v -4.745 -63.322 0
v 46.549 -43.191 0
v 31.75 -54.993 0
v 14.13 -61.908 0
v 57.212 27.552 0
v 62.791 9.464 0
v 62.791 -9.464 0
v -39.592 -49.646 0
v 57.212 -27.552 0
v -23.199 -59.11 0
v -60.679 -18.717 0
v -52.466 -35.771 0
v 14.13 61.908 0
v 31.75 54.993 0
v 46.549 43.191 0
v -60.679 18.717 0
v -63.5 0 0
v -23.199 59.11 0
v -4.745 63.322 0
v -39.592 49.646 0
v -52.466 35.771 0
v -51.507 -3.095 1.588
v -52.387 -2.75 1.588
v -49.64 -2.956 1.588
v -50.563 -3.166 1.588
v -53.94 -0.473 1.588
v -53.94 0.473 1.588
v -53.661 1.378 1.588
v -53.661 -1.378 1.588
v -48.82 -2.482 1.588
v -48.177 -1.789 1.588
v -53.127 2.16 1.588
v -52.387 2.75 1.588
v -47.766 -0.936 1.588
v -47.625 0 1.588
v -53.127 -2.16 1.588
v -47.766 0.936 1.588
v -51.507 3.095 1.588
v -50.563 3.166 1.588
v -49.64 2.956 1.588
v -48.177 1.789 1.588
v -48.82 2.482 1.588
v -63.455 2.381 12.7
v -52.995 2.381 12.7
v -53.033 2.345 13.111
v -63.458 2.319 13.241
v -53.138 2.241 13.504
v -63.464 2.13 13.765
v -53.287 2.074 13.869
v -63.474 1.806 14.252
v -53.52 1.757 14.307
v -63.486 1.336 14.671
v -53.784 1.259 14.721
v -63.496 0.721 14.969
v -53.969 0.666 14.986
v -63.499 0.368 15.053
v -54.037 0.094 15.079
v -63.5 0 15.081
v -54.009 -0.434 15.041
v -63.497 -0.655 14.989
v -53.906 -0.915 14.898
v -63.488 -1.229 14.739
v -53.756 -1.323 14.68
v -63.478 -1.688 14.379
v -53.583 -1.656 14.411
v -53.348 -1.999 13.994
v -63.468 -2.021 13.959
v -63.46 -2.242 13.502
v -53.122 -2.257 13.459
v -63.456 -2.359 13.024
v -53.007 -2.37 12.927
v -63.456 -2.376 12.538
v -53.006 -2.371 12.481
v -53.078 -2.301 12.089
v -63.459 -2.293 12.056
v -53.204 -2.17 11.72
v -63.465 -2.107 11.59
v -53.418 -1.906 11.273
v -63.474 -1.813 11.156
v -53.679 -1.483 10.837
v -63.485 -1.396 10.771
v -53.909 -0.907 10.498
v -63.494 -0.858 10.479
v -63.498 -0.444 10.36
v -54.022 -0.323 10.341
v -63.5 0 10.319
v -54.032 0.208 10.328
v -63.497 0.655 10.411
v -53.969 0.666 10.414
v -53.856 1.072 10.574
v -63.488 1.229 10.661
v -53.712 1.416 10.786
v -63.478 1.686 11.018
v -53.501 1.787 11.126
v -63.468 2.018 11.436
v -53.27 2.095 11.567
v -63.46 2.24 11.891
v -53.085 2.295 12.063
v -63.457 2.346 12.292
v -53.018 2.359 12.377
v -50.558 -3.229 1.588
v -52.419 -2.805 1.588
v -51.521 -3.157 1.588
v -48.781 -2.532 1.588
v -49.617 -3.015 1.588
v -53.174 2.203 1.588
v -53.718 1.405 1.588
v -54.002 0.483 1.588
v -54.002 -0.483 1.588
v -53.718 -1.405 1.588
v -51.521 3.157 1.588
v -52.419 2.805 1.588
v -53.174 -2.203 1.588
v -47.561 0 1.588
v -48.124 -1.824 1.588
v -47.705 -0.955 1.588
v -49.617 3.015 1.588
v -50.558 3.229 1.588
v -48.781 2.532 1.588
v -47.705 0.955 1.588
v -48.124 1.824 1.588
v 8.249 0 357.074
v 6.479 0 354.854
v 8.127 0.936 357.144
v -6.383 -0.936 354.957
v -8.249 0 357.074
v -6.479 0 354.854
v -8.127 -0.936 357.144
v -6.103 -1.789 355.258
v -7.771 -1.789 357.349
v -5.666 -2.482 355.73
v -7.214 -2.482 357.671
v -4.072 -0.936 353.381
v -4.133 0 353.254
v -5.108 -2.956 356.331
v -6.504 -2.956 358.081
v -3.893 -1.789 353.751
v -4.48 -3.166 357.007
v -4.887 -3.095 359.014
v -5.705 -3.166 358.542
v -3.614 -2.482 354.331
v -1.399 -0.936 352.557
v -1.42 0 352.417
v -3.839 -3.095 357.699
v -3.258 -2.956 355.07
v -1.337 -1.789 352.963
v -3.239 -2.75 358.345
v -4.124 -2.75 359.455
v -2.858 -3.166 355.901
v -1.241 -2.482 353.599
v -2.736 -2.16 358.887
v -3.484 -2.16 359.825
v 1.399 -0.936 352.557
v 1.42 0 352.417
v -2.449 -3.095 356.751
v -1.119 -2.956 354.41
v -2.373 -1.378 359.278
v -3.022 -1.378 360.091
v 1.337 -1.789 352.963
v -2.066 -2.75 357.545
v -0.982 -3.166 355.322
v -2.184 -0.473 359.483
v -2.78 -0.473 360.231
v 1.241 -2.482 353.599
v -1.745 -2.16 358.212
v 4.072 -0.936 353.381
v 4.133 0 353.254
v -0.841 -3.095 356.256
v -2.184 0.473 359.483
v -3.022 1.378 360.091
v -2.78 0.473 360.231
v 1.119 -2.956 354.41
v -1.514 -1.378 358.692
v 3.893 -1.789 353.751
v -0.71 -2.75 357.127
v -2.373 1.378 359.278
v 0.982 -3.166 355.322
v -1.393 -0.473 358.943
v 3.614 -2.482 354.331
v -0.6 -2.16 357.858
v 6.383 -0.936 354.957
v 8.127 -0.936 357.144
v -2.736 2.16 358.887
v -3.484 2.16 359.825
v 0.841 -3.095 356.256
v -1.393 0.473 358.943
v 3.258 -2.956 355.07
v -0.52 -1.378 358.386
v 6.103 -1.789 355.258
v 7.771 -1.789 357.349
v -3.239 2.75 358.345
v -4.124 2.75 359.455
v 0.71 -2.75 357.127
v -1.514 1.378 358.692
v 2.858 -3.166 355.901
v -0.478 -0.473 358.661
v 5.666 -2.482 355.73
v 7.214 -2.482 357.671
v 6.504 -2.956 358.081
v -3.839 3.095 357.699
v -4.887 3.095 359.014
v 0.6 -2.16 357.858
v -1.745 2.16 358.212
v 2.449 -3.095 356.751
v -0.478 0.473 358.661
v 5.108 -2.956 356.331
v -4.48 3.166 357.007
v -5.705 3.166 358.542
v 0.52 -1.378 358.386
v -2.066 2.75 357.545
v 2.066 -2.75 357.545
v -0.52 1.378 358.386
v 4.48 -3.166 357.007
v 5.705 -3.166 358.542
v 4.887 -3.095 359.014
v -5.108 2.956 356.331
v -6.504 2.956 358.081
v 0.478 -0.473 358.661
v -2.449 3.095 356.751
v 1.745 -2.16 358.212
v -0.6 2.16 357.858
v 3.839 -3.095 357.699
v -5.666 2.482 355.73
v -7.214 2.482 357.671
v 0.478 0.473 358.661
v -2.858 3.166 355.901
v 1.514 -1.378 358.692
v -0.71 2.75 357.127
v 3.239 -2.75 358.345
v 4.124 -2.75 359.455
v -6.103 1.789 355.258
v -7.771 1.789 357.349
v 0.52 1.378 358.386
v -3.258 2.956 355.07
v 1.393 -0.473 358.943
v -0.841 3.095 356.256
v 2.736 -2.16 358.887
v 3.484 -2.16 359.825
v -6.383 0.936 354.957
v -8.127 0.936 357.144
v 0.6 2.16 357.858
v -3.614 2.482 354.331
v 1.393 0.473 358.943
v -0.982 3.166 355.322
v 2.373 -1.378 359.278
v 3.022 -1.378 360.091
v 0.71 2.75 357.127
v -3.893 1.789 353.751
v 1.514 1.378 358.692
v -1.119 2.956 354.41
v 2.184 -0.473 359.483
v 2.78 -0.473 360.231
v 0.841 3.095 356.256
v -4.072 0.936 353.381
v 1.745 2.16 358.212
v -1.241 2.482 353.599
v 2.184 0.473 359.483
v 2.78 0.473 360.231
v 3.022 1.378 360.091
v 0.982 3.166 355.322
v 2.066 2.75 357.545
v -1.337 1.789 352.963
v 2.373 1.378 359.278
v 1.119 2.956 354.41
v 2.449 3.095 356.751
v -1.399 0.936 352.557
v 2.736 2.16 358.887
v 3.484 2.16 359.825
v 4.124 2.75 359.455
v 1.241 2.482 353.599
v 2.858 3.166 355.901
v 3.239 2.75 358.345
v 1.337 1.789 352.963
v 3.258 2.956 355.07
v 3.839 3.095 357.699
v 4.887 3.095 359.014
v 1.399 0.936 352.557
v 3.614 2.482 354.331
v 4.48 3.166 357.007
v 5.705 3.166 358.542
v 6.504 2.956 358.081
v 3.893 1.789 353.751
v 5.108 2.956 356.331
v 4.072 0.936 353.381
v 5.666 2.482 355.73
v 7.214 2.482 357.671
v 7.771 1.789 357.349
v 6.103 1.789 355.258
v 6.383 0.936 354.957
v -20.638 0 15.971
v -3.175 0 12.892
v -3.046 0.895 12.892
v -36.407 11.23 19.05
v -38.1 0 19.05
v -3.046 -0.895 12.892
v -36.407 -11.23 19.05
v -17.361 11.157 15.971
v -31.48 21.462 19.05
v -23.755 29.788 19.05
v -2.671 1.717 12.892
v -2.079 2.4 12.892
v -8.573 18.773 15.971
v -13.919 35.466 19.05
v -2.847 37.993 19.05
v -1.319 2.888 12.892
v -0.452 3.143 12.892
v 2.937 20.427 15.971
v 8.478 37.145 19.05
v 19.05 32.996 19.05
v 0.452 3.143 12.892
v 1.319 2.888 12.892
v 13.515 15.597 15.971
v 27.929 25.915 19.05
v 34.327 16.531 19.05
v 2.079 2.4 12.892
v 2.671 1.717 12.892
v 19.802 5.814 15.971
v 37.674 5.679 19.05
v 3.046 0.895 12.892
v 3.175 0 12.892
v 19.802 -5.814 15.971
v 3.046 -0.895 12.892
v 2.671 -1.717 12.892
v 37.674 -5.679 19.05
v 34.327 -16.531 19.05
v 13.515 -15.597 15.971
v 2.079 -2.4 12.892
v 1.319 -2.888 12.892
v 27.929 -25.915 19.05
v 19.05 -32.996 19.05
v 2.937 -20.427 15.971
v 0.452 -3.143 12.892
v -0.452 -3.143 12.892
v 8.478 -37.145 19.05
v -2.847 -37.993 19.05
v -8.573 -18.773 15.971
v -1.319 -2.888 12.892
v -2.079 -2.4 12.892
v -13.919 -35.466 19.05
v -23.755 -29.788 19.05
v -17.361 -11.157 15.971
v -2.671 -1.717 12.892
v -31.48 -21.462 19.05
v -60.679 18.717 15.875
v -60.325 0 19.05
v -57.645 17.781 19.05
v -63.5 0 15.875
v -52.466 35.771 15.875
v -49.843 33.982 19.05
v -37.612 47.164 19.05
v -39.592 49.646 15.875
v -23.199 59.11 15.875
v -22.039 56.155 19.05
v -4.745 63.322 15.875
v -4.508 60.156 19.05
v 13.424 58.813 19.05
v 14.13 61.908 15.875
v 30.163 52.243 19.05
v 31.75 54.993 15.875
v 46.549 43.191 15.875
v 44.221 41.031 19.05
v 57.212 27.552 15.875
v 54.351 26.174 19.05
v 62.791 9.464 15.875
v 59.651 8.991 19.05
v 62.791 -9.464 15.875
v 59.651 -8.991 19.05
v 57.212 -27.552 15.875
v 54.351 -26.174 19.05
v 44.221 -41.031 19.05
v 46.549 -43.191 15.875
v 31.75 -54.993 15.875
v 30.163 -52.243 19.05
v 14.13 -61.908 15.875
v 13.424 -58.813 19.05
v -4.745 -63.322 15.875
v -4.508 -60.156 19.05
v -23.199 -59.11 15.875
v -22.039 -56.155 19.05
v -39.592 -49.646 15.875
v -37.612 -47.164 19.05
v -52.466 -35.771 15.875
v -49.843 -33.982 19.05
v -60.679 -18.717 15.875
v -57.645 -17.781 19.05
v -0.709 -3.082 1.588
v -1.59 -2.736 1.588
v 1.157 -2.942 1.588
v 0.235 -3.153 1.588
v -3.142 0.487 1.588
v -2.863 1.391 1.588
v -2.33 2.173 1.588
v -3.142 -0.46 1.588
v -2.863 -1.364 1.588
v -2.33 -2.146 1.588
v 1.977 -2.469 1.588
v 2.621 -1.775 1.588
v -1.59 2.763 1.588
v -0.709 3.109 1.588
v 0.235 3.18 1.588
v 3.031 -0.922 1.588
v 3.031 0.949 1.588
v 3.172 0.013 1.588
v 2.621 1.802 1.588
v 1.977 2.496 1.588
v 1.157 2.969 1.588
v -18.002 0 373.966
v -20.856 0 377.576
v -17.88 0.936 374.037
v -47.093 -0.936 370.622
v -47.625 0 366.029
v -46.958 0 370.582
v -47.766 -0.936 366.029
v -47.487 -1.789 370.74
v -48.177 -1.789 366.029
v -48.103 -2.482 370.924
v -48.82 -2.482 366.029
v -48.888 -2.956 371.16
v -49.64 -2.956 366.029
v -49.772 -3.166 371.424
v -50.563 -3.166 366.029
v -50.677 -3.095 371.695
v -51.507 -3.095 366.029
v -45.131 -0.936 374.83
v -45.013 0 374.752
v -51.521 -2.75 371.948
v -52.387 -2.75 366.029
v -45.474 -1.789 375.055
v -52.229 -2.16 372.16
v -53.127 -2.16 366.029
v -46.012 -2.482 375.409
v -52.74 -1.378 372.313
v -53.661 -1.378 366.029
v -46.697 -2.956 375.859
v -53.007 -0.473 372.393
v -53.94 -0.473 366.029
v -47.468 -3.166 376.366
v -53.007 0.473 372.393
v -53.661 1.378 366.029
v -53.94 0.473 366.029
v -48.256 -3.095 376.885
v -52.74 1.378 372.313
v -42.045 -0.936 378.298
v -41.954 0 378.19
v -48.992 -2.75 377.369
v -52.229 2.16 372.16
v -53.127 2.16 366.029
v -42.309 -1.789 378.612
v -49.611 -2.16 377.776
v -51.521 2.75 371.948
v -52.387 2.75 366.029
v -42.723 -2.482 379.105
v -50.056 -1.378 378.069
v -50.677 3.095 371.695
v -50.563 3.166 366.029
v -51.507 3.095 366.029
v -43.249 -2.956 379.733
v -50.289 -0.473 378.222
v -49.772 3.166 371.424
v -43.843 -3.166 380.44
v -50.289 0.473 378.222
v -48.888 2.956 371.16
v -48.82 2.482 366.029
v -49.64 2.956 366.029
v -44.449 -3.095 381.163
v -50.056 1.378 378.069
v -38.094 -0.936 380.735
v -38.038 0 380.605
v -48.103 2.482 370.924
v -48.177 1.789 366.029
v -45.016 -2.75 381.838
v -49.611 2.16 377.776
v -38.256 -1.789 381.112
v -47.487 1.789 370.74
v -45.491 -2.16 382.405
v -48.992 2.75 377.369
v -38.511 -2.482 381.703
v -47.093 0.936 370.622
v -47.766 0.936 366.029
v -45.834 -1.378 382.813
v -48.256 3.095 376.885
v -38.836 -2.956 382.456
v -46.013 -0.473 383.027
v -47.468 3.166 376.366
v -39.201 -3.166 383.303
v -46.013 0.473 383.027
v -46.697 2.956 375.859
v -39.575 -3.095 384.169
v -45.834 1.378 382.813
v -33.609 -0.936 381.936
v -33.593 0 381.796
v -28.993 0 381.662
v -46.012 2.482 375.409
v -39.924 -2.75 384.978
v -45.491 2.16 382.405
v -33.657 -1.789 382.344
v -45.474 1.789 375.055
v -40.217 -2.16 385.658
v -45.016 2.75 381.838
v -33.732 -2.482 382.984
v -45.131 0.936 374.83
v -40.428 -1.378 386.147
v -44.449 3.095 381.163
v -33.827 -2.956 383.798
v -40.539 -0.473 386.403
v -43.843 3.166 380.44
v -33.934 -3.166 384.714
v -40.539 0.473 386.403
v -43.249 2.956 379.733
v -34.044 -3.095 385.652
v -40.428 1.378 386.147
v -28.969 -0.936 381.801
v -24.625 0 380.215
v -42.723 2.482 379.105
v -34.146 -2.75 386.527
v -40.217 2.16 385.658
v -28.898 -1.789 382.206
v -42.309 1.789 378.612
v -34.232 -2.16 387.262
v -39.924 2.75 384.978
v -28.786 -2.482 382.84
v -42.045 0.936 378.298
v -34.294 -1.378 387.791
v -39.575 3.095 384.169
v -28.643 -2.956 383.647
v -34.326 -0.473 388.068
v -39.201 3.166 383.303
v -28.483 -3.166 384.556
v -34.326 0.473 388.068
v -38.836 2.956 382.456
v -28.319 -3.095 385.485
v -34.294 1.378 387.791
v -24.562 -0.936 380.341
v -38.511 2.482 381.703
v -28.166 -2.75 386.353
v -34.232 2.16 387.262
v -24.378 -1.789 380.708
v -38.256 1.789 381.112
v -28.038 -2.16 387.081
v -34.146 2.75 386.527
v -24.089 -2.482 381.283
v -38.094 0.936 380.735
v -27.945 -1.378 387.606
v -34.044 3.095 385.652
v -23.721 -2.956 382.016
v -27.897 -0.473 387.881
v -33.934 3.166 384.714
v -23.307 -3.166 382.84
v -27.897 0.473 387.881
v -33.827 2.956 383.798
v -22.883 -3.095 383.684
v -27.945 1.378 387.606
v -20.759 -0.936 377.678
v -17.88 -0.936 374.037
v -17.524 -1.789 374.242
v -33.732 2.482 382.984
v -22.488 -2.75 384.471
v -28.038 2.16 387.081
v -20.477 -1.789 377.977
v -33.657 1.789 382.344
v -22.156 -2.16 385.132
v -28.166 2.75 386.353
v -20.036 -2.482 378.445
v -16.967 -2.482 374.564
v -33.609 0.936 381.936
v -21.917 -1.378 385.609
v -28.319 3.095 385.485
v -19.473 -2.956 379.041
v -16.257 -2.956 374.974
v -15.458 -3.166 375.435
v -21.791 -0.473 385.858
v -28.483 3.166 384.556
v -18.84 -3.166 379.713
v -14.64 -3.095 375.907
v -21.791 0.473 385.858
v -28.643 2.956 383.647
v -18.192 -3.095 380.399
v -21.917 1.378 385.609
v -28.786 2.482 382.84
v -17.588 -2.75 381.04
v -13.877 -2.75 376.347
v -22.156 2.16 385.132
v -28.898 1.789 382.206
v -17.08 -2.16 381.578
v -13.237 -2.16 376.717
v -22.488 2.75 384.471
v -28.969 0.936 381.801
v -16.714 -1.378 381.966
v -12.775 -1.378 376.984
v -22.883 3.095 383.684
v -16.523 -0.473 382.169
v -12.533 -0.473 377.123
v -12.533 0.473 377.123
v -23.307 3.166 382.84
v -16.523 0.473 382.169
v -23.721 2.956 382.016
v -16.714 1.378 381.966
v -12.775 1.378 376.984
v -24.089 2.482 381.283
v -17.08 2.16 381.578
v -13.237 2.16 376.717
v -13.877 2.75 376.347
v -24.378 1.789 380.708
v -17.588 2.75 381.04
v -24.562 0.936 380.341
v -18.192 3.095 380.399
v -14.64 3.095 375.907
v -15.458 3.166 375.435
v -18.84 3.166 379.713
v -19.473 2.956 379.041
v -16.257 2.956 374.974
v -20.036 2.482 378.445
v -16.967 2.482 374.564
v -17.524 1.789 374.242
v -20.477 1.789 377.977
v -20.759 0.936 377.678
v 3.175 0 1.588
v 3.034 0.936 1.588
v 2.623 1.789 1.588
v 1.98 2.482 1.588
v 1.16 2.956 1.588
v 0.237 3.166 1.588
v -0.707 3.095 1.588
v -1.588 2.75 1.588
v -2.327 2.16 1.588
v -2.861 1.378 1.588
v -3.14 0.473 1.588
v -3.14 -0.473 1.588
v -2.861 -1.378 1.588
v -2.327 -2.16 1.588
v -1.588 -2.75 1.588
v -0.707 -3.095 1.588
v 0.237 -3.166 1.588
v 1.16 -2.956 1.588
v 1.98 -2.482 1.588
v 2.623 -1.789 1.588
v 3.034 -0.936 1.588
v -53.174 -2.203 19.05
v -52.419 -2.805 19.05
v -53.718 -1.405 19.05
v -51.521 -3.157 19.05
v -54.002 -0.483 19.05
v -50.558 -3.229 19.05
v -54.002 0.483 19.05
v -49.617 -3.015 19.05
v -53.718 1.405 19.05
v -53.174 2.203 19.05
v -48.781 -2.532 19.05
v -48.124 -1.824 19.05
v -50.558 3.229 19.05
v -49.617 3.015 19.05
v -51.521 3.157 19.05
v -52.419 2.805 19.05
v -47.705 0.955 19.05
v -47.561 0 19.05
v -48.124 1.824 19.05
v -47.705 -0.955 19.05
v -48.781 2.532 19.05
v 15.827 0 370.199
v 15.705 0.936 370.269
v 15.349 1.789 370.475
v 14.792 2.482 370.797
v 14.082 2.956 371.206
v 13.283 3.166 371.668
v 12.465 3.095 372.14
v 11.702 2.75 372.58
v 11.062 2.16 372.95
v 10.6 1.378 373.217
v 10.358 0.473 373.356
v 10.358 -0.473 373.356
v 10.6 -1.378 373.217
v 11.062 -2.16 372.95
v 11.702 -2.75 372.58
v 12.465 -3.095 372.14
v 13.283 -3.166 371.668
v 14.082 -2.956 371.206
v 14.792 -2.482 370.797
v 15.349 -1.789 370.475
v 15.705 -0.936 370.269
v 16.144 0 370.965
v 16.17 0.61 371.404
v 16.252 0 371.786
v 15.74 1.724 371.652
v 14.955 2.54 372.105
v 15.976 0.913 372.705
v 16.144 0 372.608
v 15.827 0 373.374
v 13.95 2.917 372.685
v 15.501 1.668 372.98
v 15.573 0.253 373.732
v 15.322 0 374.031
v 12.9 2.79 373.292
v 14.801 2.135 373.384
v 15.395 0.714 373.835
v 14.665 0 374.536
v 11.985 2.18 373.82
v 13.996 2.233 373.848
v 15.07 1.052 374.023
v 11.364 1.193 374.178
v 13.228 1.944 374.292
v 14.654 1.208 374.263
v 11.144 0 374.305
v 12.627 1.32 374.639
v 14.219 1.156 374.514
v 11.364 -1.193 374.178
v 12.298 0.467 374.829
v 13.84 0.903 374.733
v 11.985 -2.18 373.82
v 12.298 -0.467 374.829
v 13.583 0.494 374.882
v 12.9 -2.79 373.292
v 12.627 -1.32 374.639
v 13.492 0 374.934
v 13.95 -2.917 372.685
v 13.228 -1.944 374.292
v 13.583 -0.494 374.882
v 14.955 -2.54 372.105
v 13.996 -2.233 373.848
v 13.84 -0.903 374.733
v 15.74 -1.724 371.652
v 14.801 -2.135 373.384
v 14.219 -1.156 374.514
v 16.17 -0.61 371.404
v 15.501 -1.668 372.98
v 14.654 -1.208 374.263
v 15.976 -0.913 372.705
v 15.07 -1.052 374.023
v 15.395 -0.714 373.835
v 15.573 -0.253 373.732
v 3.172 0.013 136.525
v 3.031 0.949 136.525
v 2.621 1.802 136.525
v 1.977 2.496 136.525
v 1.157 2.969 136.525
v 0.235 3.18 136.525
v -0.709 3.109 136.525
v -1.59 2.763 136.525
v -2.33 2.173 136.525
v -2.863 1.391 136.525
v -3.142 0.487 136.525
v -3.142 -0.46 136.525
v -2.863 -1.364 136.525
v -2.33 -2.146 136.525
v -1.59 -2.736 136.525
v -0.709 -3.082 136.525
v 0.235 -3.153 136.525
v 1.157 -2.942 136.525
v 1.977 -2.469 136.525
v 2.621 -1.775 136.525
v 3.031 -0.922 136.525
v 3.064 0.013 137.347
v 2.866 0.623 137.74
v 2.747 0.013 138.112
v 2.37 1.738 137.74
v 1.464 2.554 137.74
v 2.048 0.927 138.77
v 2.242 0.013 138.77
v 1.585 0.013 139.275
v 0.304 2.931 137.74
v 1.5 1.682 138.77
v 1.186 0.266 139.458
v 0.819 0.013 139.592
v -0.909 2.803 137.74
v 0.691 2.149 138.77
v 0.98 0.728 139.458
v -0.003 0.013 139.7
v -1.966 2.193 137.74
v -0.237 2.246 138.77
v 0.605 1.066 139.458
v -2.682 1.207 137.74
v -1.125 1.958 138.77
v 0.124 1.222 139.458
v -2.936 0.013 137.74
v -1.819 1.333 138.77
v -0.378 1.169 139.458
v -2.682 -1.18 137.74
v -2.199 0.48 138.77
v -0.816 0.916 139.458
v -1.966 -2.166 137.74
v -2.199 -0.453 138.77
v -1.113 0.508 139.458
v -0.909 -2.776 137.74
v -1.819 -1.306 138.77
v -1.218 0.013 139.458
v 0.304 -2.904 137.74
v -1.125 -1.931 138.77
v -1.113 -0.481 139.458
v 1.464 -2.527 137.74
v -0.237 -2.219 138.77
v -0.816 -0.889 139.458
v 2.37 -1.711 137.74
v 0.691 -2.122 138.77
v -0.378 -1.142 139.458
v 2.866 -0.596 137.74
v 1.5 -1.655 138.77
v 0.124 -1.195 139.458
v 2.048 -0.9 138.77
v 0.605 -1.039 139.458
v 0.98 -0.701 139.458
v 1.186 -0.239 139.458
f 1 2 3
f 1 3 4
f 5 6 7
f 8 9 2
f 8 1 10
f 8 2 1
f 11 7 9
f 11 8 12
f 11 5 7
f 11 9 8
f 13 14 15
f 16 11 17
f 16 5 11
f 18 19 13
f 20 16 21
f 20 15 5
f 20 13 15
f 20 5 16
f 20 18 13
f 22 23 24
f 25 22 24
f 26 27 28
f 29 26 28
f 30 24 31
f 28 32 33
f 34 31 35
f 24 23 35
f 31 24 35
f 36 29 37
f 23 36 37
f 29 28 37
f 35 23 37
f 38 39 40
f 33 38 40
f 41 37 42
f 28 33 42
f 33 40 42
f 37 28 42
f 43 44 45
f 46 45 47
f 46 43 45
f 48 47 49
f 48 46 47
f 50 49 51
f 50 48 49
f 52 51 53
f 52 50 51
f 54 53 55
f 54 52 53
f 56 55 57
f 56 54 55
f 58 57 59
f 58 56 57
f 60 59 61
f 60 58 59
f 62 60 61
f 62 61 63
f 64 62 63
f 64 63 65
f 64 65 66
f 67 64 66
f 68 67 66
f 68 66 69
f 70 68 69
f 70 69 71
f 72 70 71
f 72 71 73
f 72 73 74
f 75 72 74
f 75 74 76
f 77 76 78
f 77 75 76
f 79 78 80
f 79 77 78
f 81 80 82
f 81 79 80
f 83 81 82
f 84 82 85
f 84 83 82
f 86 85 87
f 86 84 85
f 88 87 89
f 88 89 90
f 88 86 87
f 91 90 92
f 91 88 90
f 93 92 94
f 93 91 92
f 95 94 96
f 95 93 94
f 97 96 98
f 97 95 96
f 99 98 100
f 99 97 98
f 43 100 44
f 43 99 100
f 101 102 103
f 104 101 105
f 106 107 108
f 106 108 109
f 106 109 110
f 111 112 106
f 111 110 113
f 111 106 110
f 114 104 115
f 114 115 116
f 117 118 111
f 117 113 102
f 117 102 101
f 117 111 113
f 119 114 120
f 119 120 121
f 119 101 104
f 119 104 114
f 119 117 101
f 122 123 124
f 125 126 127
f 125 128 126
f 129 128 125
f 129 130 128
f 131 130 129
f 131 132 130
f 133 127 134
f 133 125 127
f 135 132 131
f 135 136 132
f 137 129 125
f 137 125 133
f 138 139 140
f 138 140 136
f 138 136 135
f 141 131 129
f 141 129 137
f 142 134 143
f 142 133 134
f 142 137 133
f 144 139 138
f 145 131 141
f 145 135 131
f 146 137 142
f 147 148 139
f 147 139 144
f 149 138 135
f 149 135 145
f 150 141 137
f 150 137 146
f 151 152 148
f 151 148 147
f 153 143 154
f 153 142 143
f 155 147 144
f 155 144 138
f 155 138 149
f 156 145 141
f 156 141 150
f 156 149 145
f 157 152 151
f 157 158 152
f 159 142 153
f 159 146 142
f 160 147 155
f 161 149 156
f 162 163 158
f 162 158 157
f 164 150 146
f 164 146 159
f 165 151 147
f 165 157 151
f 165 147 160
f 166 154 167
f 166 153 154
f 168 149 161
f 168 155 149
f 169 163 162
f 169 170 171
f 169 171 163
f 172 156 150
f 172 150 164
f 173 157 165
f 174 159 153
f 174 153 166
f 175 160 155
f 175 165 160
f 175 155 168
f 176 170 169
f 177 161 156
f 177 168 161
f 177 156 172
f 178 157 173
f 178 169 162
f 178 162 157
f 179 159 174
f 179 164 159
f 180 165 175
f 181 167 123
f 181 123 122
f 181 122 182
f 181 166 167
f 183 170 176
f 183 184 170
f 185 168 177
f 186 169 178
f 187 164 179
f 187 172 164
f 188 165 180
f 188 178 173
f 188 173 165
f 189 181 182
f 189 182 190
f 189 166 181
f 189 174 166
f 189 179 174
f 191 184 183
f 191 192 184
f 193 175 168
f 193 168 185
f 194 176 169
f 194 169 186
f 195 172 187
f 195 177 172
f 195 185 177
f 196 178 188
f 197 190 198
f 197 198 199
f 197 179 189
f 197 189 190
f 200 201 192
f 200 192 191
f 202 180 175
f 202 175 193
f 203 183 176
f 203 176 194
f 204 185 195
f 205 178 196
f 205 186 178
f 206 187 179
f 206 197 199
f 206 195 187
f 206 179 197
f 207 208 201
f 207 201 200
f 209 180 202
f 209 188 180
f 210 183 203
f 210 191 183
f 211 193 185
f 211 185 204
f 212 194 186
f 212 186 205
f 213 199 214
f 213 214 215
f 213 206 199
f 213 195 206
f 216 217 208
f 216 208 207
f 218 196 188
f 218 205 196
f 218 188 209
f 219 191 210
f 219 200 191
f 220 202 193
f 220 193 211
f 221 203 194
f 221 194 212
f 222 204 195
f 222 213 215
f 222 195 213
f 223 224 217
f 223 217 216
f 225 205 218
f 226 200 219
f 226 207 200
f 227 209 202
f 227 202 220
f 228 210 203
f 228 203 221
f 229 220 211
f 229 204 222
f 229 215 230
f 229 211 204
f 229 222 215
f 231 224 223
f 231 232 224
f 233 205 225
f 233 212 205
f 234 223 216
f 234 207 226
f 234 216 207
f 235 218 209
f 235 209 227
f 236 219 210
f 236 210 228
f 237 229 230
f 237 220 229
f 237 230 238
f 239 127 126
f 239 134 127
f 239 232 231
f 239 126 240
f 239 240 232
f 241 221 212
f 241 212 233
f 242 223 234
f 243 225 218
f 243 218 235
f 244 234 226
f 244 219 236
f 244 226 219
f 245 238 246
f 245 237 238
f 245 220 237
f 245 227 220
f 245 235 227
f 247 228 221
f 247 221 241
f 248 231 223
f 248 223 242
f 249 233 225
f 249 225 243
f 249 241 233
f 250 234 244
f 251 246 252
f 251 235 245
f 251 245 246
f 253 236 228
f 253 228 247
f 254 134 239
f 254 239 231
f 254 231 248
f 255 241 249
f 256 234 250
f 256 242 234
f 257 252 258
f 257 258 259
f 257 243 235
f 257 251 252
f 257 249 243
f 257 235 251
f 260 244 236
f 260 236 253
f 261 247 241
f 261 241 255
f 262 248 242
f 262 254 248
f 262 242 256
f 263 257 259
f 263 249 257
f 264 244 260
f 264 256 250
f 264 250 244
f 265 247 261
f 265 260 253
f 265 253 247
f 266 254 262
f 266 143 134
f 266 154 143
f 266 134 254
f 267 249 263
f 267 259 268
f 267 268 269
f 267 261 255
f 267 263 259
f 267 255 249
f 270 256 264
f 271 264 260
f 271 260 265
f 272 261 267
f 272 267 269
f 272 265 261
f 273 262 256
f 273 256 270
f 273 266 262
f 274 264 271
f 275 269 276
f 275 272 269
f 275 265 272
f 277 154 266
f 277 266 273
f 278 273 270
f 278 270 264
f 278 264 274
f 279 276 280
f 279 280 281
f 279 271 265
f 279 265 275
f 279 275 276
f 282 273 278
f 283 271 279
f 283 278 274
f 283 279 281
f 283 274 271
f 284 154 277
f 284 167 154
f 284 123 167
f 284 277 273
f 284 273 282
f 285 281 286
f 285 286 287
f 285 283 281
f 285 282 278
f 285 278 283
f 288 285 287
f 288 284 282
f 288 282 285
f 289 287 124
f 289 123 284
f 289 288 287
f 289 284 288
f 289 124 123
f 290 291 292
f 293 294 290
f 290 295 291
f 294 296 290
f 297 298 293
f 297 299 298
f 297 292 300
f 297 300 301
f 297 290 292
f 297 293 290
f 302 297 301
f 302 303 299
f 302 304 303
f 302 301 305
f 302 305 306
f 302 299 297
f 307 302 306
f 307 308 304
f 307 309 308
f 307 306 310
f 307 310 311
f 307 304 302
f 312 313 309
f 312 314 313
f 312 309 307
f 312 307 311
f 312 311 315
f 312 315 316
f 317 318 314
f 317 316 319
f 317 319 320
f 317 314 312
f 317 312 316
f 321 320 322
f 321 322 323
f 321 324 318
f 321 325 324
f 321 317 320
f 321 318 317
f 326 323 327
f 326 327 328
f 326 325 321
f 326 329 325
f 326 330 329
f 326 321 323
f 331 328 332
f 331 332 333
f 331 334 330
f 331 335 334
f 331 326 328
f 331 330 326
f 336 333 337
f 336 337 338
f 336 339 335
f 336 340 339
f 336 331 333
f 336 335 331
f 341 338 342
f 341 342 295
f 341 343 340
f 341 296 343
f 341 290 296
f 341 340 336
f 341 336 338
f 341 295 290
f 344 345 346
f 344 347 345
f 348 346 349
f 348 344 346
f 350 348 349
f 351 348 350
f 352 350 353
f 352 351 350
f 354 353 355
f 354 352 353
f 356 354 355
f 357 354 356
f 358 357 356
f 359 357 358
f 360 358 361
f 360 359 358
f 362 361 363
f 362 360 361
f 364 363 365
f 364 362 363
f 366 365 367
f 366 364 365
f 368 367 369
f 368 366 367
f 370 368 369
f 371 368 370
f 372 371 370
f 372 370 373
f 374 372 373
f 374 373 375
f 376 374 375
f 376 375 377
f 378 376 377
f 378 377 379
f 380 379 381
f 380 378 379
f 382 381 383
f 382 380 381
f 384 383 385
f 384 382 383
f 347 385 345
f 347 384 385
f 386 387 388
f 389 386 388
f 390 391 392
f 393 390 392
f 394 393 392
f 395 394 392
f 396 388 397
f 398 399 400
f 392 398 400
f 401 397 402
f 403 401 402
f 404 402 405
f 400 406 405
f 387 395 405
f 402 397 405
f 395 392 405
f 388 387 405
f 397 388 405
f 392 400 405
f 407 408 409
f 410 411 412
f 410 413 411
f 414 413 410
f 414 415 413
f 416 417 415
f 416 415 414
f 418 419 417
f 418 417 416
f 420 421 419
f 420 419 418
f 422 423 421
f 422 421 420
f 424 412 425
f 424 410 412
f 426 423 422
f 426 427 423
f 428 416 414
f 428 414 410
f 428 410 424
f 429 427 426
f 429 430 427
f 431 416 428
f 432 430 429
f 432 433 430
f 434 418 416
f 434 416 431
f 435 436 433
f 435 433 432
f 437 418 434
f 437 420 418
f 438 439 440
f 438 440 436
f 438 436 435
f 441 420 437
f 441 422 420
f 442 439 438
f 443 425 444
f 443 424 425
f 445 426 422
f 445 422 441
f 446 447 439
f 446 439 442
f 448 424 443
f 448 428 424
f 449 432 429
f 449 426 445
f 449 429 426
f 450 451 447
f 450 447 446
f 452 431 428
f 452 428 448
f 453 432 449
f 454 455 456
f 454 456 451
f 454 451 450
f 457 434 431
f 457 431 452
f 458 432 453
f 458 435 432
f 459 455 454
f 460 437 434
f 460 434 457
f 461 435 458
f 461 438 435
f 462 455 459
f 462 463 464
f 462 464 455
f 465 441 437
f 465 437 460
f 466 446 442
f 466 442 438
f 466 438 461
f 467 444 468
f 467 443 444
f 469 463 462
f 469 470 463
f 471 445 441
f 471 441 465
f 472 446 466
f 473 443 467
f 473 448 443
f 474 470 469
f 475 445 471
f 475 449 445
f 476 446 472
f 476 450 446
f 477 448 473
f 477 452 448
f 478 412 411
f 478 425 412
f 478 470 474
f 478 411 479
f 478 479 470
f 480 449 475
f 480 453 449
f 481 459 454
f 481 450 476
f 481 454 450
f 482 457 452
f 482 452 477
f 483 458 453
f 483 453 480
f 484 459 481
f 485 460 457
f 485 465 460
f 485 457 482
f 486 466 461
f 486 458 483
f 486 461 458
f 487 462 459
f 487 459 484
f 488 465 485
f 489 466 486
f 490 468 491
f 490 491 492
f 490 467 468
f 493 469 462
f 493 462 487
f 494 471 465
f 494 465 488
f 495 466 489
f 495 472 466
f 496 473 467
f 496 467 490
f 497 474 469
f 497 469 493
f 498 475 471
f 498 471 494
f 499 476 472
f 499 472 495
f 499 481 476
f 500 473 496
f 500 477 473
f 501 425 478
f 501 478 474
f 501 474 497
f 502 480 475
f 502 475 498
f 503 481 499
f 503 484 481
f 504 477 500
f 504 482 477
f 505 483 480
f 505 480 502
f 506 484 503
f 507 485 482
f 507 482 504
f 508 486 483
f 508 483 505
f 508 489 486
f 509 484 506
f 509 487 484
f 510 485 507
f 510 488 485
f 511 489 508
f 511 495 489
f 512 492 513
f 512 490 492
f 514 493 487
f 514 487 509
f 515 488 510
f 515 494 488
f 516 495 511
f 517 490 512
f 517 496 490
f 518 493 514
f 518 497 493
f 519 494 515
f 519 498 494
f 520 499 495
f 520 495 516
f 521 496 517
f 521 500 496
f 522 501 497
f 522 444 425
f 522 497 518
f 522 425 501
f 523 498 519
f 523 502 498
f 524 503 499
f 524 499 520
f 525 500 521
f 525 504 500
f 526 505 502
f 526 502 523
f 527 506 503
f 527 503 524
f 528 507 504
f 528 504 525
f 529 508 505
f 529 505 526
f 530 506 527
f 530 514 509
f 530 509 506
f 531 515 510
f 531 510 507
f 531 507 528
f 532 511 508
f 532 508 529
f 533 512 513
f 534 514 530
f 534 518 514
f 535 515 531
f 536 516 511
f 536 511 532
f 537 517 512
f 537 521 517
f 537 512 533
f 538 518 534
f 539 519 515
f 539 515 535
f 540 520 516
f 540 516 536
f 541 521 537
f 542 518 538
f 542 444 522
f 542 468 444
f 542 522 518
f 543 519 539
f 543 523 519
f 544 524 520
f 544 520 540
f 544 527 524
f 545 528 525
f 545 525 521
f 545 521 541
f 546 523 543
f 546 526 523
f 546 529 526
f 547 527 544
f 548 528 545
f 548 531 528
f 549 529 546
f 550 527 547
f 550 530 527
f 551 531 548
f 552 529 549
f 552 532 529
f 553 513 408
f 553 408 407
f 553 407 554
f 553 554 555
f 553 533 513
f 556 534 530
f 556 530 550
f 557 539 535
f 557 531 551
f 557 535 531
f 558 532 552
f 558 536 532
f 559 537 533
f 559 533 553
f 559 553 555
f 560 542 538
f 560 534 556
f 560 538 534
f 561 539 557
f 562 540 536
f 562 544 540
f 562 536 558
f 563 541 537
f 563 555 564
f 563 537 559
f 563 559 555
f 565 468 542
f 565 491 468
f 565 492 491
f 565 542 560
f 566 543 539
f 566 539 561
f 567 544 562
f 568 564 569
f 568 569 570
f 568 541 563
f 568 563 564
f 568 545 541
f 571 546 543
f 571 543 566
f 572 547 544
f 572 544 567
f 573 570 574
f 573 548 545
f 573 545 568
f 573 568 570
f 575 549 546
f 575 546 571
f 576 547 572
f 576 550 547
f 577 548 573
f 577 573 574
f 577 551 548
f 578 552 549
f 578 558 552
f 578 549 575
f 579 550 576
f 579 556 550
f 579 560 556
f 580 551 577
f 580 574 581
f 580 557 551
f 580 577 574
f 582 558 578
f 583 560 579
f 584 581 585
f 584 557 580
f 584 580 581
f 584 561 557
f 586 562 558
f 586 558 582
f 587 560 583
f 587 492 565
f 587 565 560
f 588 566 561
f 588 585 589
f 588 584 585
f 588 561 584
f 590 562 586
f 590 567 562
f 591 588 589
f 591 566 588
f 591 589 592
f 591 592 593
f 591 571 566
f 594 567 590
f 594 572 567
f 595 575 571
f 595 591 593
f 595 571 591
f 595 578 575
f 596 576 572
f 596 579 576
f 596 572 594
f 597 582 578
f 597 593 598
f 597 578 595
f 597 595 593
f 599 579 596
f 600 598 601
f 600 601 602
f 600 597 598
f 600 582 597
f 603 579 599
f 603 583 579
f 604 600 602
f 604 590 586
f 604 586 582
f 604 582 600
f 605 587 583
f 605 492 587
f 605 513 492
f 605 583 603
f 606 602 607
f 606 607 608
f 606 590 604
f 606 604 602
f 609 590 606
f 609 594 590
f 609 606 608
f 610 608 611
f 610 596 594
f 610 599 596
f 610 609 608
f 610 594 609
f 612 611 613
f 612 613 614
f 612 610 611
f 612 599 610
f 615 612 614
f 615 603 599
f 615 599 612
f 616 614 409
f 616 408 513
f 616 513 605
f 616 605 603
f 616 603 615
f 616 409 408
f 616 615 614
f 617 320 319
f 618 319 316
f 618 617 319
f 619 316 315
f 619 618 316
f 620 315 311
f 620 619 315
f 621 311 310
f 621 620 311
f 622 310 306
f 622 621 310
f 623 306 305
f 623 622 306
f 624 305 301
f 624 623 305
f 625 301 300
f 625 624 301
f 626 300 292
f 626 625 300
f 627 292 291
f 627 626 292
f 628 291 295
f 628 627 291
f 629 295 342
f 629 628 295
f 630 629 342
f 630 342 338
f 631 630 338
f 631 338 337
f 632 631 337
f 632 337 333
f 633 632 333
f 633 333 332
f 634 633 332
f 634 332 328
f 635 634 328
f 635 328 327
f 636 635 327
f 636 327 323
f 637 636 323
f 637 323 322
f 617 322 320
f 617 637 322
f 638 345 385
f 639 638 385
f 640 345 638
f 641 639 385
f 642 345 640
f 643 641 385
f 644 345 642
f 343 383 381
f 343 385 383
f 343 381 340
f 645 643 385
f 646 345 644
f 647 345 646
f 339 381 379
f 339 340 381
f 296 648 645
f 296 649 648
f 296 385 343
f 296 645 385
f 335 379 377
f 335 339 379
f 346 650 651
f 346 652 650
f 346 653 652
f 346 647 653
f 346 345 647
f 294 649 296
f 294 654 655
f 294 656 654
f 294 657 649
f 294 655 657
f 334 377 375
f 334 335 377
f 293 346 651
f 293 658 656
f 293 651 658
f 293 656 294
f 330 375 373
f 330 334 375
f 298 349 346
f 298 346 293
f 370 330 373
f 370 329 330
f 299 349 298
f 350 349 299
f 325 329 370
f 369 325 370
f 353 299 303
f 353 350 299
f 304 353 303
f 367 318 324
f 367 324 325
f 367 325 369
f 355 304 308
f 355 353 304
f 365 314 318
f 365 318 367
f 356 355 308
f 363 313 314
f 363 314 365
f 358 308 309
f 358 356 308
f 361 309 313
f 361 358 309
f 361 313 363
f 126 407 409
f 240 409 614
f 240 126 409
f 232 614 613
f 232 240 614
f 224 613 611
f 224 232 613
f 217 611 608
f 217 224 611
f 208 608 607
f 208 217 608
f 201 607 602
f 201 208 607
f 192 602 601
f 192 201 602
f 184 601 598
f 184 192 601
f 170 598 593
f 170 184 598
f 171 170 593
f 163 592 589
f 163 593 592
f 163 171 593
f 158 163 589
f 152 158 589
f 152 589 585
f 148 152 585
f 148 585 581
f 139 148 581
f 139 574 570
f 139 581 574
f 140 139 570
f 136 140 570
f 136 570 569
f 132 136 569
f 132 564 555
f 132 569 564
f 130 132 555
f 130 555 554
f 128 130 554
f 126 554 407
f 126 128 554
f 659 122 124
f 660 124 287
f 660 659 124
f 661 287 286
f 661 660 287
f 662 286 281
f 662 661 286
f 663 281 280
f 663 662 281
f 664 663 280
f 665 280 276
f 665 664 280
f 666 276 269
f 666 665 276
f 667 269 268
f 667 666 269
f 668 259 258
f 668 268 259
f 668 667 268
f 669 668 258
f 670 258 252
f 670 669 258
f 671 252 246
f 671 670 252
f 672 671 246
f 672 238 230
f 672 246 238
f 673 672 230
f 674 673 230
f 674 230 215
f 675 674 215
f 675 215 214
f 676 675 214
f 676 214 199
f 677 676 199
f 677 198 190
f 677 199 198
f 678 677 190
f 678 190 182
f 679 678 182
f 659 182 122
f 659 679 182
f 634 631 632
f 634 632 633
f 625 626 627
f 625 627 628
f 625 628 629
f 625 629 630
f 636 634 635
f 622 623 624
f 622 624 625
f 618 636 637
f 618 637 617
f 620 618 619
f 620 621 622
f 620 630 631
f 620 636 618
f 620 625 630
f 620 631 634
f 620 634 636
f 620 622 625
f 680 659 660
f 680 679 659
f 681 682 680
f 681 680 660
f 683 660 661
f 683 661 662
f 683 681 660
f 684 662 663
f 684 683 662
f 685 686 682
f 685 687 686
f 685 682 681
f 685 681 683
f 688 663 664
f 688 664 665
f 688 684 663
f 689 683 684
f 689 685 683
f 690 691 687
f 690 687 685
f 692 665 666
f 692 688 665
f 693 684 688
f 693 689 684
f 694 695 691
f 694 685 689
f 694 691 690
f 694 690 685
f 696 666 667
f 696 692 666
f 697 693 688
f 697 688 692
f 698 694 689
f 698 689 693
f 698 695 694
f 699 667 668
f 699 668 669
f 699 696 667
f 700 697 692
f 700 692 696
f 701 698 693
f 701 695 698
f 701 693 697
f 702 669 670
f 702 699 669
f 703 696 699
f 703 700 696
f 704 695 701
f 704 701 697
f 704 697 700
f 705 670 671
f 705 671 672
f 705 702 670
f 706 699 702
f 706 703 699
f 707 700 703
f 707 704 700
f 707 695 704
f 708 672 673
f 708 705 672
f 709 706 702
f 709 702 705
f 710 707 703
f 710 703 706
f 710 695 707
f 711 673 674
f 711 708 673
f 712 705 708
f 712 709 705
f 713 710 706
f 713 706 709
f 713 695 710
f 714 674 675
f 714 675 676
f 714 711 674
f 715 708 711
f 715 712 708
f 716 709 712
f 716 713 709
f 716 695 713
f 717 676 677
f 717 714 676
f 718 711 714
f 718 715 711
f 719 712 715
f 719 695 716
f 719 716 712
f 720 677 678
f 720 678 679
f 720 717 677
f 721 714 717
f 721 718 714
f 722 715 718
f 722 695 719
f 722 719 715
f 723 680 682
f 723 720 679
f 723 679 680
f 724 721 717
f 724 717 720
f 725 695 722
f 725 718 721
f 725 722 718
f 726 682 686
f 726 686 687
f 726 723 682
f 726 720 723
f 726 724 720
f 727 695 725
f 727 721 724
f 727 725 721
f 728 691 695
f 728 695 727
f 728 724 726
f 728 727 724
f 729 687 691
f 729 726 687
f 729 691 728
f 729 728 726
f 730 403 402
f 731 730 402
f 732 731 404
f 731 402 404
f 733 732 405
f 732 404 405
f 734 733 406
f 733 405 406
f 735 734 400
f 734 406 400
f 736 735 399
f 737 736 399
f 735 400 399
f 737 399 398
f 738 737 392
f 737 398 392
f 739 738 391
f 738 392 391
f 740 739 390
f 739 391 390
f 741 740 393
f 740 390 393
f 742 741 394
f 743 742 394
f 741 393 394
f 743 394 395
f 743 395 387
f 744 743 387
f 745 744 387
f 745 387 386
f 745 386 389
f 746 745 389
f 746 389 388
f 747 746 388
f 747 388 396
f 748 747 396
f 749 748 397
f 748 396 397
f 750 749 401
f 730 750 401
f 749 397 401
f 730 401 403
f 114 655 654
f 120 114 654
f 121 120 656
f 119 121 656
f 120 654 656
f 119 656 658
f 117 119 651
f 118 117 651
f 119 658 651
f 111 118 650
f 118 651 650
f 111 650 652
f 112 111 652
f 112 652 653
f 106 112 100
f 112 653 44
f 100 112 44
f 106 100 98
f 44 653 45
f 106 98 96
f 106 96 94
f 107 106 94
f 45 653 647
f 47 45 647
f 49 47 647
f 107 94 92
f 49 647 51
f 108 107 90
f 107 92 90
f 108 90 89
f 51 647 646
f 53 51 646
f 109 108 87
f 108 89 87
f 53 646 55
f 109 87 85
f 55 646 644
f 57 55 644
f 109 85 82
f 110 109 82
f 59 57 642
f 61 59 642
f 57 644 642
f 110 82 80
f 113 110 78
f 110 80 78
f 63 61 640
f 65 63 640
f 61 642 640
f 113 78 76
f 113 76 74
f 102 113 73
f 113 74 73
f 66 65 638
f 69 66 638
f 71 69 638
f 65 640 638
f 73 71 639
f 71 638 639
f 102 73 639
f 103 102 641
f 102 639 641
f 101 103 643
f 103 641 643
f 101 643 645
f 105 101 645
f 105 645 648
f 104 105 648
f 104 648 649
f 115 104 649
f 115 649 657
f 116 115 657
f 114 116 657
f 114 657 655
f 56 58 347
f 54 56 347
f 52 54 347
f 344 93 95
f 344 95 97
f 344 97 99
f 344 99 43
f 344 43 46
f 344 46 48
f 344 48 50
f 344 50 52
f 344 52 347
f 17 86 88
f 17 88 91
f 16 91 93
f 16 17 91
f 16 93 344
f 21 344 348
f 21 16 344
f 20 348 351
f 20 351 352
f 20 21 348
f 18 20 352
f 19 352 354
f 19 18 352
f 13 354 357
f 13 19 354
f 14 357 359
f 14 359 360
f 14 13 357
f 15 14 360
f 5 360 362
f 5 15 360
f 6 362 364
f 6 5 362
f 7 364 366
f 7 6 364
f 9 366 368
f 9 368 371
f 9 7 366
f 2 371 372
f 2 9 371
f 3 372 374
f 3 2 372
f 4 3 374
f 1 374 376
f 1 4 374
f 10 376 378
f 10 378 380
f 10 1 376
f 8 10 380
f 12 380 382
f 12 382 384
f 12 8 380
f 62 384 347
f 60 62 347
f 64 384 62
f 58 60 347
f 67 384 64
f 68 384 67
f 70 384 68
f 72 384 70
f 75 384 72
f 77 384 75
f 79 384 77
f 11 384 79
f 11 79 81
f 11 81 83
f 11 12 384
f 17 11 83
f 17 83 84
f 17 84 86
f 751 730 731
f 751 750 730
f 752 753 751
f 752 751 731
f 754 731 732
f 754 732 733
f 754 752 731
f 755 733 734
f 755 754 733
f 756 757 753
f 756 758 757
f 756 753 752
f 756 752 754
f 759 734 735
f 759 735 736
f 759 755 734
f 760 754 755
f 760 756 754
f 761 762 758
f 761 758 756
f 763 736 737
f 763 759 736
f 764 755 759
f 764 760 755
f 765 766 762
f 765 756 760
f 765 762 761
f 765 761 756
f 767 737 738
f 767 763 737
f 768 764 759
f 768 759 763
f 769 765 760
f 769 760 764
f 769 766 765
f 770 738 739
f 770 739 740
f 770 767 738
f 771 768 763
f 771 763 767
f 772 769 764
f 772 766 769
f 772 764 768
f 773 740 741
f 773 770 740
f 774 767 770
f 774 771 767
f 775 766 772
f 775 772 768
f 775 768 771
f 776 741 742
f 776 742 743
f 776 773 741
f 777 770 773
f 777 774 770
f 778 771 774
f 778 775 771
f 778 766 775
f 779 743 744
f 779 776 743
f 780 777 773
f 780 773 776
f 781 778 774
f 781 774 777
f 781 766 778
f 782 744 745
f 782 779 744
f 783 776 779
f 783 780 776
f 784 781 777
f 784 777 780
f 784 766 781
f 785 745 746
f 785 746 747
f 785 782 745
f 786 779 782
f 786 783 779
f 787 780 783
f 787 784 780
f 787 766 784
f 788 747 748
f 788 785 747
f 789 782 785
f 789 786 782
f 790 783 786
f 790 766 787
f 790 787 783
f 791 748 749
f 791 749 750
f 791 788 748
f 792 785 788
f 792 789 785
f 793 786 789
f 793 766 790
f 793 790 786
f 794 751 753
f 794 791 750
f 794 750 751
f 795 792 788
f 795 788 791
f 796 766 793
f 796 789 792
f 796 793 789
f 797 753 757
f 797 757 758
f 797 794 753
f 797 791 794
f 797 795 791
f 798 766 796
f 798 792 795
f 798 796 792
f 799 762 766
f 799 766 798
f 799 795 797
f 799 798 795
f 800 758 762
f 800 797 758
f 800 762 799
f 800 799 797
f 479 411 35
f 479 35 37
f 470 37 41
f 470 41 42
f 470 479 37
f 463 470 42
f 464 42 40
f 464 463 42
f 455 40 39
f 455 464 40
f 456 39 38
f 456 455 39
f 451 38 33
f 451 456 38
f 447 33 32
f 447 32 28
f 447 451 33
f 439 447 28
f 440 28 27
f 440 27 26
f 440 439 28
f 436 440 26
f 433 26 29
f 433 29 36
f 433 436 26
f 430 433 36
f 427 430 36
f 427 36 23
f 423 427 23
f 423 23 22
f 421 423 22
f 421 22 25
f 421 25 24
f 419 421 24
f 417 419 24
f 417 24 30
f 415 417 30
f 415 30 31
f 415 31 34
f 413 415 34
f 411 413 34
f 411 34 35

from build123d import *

# Parameters (mm, degrees)
F2_R      = 3.2385
F3_DEPTH  = 17.4625
F5_START  = 1.5875
F4_R      = 3.175
F5_DEPTH  = 13.6525
F7_START  = 1.5875
F6_R      = 3.175
F7_DEPTH  = 138.1125
F9_R      = 2.38125
F10_DEPTH = 12.7
F12_R     = 3.175
F14_R     = 3.175
F14_2_R   = 3.175


with BuildPart() as f1:
    # F0 (on Front) → F1 (revolve)
    with BuildSketch(Plane.XZ):
        Polygon((-63.5, 0), (0, 0), (0, 12.331942035), (-38.1, 19.05), (-60.325, 19.05), (-63.5, 15.875), align=None)
    revolve(axis=Axis((0, 0, 9.525), (0, 0, -1)))

    # F2 (on face) → F3 (cut)
    with BuildSketch(Plane.XY.offset(19.05)):
        with Locations((-50.8, 0)):
            Circle(F2_R)
    extrude(amount=-F3_DEPTH, mode=Mode.SUBTRACT)

    # F4 (on Top) → F5 (cut)
    with BuildSketch(Plane.XY.offset(F5_START)):
        Circle(F4_R)
    extrude(amount=F5_DEPTH, mode=Mode.SUBTRACT)

    # F9 (on offset) → F10 (cut)
    with BuildSketch(Plane.YZ.offset(-63.5)):
        with Locations((0, 12.7)):
            Circle(F9_R)
    extrude(amount=F10_DEPTH, mode=Mode.SUBTRACT)


with BuildPart() as f7:
    # F6 (on Top) → F7 (new body)
    with BuildSketch(Plane.XY.offset(F7_START)):
        with Locations((-0.0027317612, 0.0134480688)):
            Circle(F6_R)
    extrude(amount=F7_DEPTH)

    # F14
    f14_edges = [f7.edges().sort_by_distance(p)[0] for p in [
        (-3.177732, 0.013448, 139.7),
    ]]
    fillet(f14_edges, radius=F14_R)


with BuildPart() as f13:
    # F13: sweep along a path in F11
    with BuildLine(Plane.XZ) as f13_path:
        Line((-50.8, 1.5875), (-50.8, 366.0286357684))
        ThreePointArc((-50.8, 366.0286357684), (-36.6805028092, 384.4295227592), (-15.2522160579, 375.5536357684))
        Line((-15.2522160579, 375.5536357684), (-5.499261314, 358.6610226281))
        ThreePointArc((-5.499261314, 358.6610226281), (0, 355.4860226281), (5.499261314, 358.6610226281))
        Line((5.499261314, 358.6610226281), (14.6646968374, 374.5360226281))
    # F12 (on face) → F13 (sweep)
    with BuildSketch(Plane.XY.offset(1.5875)):
        with Locations((-50.8, 0)):
            Circle(F12_R)
    sweep(path=f13_path.line)

    # F14#2
    f14_2_edges = [f13.edges().sort_by_distance(p)[0] for p in [
        (11.915066, 0, 376.123523),
    ]]
    fillet(f14_2_edges, radius=F14_2_R)


solid = Compound([f1.part, f7.part, f13.part])
